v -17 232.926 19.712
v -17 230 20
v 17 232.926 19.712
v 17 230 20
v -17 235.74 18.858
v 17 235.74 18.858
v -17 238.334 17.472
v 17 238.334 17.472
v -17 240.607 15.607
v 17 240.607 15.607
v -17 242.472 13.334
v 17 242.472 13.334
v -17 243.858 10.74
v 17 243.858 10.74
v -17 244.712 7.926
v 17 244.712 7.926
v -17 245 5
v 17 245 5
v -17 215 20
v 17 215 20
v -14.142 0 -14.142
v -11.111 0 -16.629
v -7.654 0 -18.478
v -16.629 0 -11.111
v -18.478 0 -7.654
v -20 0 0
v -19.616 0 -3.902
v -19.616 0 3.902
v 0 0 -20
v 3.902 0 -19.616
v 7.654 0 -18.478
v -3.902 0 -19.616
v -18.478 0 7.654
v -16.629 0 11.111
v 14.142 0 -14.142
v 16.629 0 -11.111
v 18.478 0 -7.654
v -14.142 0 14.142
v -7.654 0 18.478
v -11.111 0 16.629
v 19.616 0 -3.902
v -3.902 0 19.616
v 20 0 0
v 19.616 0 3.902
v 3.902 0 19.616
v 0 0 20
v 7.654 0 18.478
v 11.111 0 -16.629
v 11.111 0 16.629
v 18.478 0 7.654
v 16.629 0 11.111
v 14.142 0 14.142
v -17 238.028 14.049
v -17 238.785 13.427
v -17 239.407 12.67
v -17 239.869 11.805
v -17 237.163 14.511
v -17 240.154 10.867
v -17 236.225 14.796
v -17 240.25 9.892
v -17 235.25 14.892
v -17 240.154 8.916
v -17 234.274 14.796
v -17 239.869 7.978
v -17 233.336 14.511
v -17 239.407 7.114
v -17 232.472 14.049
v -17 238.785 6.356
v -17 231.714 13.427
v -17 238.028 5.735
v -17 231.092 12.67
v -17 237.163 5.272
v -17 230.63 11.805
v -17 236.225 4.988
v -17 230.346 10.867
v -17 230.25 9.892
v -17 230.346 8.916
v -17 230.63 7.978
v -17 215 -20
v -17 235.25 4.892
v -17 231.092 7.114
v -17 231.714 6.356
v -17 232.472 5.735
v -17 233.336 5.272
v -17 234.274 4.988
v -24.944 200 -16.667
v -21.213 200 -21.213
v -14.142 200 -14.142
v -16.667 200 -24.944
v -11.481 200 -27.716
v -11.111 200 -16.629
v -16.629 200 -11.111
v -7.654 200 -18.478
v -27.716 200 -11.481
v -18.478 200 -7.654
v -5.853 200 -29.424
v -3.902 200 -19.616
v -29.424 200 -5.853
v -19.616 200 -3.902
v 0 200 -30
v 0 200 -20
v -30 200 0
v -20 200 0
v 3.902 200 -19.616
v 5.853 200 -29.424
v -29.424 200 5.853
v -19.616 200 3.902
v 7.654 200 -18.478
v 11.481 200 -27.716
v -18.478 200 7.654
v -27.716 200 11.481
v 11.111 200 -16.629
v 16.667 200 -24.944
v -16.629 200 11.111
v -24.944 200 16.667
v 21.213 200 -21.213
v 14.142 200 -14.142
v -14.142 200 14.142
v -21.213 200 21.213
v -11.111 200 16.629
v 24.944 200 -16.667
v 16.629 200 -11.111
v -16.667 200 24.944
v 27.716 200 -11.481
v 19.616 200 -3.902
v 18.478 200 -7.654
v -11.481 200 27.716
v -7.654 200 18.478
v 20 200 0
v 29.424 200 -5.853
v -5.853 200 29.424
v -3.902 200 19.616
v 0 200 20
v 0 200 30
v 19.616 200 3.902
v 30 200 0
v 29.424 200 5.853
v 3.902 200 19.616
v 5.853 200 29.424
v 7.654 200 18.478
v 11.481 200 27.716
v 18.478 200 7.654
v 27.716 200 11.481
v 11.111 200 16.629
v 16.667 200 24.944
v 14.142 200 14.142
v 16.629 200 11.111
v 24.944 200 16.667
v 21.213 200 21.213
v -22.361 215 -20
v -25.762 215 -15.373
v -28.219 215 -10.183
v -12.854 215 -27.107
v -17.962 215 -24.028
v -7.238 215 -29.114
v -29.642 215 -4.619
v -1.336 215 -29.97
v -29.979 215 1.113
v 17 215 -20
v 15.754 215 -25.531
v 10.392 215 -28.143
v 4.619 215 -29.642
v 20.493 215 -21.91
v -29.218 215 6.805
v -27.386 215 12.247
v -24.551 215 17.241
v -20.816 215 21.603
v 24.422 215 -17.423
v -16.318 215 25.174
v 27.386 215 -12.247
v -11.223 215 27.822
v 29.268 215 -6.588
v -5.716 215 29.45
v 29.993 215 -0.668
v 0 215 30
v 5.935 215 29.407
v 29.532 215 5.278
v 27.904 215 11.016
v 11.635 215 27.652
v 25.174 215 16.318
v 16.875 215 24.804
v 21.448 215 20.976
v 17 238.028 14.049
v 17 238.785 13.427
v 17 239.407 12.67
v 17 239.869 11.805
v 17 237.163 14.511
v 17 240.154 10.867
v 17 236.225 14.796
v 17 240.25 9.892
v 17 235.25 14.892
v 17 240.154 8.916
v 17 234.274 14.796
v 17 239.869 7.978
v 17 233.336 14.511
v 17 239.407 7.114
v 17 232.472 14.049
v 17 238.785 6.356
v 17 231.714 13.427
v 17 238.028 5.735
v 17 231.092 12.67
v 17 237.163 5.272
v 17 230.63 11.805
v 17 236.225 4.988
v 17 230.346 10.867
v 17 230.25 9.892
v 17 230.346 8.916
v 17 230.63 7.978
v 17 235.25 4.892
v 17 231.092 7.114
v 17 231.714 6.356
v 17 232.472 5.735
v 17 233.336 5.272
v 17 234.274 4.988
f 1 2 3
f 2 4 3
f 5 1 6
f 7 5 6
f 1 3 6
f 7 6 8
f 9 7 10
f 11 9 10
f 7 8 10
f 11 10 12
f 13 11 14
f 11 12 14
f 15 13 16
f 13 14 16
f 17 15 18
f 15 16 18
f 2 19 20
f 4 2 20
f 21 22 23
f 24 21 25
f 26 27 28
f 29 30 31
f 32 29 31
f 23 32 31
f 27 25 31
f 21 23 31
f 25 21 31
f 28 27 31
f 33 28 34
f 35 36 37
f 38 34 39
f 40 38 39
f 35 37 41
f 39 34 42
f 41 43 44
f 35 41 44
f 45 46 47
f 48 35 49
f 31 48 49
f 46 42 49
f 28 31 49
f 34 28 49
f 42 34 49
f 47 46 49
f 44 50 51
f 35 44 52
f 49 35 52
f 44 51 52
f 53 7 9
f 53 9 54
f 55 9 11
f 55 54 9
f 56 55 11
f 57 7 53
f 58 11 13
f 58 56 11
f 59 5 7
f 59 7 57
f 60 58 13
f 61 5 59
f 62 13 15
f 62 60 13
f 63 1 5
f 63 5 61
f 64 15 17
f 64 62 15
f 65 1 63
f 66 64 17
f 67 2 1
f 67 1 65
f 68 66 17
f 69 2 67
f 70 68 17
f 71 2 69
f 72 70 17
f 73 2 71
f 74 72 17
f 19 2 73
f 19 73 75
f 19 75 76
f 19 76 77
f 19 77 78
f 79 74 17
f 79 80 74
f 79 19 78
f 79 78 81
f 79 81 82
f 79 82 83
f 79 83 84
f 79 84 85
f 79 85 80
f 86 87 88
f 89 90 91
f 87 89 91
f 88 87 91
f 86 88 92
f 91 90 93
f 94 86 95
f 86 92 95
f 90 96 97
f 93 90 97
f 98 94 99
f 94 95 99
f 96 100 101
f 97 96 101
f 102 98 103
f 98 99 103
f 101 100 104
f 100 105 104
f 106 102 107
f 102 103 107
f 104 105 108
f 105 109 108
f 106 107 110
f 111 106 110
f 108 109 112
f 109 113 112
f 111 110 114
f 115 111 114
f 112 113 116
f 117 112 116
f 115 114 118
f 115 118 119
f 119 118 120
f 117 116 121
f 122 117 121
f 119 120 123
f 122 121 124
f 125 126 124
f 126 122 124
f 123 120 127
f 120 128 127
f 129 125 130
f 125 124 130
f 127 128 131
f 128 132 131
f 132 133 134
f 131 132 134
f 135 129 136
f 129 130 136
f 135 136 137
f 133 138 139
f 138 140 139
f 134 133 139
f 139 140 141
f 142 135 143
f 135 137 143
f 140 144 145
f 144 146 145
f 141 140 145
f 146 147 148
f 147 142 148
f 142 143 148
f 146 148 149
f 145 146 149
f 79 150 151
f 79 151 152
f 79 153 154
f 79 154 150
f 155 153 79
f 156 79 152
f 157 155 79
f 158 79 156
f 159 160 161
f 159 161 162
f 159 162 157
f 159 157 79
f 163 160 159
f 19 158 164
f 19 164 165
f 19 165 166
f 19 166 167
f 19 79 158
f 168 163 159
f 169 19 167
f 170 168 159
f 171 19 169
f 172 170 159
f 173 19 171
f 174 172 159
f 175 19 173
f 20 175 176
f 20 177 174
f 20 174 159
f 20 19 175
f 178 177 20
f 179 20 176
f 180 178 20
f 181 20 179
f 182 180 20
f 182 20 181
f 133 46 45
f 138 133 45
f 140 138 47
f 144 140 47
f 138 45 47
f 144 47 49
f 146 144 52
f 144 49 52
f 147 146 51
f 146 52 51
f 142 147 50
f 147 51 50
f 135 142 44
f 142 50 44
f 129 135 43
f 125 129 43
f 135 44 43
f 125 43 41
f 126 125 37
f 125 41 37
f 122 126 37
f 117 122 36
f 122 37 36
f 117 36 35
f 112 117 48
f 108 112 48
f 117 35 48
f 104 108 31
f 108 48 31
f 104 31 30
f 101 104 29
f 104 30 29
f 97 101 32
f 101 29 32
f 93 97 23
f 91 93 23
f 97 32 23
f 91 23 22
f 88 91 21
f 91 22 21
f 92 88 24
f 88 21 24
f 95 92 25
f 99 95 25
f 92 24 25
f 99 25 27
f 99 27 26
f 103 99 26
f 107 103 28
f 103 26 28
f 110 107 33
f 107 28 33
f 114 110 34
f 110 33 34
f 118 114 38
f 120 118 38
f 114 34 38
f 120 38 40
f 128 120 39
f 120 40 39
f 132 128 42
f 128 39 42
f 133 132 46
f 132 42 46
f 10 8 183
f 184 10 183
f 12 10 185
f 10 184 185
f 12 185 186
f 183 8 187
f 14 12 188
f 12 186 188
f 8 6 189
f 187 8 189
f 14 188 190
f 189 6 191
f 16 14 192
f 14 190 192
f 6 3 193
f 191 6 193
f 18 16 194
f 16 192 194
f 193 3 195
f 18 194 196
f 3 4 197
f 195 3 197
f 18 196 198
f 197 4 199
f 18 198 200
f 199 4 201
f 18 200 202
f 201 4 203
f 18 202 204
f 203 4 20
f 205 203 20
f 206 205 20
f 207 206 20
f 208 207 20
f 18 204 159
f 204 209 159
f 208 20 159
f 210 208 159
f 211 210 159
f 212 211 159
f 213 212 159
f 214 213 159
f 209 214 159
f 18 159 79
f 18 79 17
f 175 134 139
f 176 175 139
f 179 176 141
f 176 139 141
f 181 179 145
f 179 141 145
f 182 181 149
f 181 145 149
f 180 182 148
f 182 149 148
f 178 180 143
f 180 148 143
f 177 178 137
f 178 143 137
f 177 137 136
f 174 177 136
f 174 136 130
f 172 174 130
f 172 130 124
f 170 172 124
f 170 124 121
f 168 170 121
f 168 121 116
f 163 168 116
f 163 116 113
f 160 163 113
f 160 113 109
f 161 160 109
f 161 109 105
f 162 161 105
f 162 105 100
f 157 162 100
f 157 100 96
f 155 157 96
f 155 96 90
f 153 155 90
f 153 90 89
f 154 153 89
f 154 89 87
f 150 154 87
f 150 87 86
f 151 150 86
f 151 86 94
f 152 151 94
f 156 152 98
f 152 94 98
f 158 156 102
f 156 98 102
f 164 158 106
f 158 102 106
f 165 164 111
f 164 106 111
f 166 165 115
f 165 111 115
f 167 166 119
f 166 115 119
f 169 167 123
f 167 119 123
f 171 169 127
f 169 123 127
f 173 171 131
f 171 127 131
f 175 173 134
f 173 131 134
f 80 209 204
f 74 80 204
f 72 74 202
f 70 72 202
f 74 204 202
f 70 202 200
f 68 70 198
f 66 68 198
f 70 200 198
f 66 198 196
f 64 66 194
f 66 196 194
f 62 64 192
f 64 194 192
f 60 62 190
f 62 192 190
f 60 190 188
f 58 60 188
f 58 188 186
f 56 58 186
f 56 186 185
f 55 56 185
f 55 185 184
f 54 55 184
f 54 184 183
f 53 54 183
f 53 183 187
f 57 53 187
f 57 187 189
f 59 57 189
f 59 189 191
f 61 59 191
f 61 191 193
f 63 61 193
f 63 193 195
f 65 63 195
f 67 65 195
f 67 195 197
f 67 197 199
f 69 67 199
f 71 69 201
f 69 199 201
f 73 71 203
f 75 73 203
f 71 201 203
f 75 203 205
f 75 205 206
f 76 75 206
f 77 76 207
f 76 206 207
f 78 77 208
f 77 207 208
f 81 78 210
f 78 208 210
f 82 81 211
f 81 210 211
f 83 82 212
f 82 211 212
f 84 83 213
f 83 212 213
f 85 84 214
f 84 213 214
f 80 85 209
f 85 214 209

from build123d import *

# Parameters (mm, degrees)
SKETCH1_R           = 20
BOSS_EXTRUDE1_DEPTH = 200
SKETCH2_R           = 30
BOSS_EXTRUDE2_DEPTH = 15
SKETCH3_W           = 34
SKETCH3_H           = 40
BOSS_EXTRUDE3_DEPTH = 30
CUT_EXTRUDE1_DEPTH  = 59
FILLET1_R           = 15
SKETCH5_R           = 5
CUT_EXTRUDE2_DEPTH  = 59


with BuildPart() as part:
    # Sketch1 → Boss-Extrude1 (new body)
    with BuildSketch(Plane(origin=(0, 0, 0), x_dir=(1, 0, 0), z_dir=(0, 1, 0))):
        with Locations(Location((0, 0, 0), (0, 0, 270))):
            Circle(SKETCH1_R)
    extrude(amount=BOSS_EXTRUDE1_DEPTH)

    # Sketch2 → Boss-Extrude2 (add)
    with BuildSketch(Plane(origin=(0, 200, 0), x_dir=(1, 0, 0), z_dir=(0, 1, 0))):
        with Locations(Location((0, 0, 0), (0, 0, 270))):
            Circle(SKETCH2_R)
    extrude(amount=BOSS_EXTRUDE2_DEPTH)

    # Sketch3 → Boss-Extrude3 (add)
    with BuildSketch(Plane(origin=(0, 215, 0), x_dir=(1, 0, 0), z_dir=(0, 1, 0))):
        Rectangle(SKETCH3_W, SKETCH3_H)
    extrude(amount=BOSS_EXTRUDE3_DEPTH)

    # Sketch4 → Cut-Extrude1 (cut)
    with BuildSketch(Plane(origin=(17, 0, 0), x_dir=(0, 0, -1), z_dir=(1, 0, 0))):
        Polygon((20, 215), (-5, 245), (20, 245), align=None)
    extrude(amount=-CUT_EXTRUDE1_DEPTH, mode=Mode.SUBTRACT)

    # Fillet1
    fillet1_edges = [part.edges().sort_by_distance(p)[0] for p in [
        (0, 245, 20),
    ]]
    fillet(fillet1_edges, radius=FILLET1_R - 0.0001)  # a hair under: the kernel refuses the full size

    # Sketch5 → Cut-Extrude2 (cut)
    with BuildSketch(Plane(origin=(17, 0, 0), x_dir=(0, 0, -1), z_dir=(1, 0, 0))):
        with Locations((-9.891874818, 235.24975043)):
            Circle(SKETCH5_R)
    extrude(amount=-CUT_EXTRUDE2_DEPTH, mode=Mode.SUBTRACT)


solid = part.part
